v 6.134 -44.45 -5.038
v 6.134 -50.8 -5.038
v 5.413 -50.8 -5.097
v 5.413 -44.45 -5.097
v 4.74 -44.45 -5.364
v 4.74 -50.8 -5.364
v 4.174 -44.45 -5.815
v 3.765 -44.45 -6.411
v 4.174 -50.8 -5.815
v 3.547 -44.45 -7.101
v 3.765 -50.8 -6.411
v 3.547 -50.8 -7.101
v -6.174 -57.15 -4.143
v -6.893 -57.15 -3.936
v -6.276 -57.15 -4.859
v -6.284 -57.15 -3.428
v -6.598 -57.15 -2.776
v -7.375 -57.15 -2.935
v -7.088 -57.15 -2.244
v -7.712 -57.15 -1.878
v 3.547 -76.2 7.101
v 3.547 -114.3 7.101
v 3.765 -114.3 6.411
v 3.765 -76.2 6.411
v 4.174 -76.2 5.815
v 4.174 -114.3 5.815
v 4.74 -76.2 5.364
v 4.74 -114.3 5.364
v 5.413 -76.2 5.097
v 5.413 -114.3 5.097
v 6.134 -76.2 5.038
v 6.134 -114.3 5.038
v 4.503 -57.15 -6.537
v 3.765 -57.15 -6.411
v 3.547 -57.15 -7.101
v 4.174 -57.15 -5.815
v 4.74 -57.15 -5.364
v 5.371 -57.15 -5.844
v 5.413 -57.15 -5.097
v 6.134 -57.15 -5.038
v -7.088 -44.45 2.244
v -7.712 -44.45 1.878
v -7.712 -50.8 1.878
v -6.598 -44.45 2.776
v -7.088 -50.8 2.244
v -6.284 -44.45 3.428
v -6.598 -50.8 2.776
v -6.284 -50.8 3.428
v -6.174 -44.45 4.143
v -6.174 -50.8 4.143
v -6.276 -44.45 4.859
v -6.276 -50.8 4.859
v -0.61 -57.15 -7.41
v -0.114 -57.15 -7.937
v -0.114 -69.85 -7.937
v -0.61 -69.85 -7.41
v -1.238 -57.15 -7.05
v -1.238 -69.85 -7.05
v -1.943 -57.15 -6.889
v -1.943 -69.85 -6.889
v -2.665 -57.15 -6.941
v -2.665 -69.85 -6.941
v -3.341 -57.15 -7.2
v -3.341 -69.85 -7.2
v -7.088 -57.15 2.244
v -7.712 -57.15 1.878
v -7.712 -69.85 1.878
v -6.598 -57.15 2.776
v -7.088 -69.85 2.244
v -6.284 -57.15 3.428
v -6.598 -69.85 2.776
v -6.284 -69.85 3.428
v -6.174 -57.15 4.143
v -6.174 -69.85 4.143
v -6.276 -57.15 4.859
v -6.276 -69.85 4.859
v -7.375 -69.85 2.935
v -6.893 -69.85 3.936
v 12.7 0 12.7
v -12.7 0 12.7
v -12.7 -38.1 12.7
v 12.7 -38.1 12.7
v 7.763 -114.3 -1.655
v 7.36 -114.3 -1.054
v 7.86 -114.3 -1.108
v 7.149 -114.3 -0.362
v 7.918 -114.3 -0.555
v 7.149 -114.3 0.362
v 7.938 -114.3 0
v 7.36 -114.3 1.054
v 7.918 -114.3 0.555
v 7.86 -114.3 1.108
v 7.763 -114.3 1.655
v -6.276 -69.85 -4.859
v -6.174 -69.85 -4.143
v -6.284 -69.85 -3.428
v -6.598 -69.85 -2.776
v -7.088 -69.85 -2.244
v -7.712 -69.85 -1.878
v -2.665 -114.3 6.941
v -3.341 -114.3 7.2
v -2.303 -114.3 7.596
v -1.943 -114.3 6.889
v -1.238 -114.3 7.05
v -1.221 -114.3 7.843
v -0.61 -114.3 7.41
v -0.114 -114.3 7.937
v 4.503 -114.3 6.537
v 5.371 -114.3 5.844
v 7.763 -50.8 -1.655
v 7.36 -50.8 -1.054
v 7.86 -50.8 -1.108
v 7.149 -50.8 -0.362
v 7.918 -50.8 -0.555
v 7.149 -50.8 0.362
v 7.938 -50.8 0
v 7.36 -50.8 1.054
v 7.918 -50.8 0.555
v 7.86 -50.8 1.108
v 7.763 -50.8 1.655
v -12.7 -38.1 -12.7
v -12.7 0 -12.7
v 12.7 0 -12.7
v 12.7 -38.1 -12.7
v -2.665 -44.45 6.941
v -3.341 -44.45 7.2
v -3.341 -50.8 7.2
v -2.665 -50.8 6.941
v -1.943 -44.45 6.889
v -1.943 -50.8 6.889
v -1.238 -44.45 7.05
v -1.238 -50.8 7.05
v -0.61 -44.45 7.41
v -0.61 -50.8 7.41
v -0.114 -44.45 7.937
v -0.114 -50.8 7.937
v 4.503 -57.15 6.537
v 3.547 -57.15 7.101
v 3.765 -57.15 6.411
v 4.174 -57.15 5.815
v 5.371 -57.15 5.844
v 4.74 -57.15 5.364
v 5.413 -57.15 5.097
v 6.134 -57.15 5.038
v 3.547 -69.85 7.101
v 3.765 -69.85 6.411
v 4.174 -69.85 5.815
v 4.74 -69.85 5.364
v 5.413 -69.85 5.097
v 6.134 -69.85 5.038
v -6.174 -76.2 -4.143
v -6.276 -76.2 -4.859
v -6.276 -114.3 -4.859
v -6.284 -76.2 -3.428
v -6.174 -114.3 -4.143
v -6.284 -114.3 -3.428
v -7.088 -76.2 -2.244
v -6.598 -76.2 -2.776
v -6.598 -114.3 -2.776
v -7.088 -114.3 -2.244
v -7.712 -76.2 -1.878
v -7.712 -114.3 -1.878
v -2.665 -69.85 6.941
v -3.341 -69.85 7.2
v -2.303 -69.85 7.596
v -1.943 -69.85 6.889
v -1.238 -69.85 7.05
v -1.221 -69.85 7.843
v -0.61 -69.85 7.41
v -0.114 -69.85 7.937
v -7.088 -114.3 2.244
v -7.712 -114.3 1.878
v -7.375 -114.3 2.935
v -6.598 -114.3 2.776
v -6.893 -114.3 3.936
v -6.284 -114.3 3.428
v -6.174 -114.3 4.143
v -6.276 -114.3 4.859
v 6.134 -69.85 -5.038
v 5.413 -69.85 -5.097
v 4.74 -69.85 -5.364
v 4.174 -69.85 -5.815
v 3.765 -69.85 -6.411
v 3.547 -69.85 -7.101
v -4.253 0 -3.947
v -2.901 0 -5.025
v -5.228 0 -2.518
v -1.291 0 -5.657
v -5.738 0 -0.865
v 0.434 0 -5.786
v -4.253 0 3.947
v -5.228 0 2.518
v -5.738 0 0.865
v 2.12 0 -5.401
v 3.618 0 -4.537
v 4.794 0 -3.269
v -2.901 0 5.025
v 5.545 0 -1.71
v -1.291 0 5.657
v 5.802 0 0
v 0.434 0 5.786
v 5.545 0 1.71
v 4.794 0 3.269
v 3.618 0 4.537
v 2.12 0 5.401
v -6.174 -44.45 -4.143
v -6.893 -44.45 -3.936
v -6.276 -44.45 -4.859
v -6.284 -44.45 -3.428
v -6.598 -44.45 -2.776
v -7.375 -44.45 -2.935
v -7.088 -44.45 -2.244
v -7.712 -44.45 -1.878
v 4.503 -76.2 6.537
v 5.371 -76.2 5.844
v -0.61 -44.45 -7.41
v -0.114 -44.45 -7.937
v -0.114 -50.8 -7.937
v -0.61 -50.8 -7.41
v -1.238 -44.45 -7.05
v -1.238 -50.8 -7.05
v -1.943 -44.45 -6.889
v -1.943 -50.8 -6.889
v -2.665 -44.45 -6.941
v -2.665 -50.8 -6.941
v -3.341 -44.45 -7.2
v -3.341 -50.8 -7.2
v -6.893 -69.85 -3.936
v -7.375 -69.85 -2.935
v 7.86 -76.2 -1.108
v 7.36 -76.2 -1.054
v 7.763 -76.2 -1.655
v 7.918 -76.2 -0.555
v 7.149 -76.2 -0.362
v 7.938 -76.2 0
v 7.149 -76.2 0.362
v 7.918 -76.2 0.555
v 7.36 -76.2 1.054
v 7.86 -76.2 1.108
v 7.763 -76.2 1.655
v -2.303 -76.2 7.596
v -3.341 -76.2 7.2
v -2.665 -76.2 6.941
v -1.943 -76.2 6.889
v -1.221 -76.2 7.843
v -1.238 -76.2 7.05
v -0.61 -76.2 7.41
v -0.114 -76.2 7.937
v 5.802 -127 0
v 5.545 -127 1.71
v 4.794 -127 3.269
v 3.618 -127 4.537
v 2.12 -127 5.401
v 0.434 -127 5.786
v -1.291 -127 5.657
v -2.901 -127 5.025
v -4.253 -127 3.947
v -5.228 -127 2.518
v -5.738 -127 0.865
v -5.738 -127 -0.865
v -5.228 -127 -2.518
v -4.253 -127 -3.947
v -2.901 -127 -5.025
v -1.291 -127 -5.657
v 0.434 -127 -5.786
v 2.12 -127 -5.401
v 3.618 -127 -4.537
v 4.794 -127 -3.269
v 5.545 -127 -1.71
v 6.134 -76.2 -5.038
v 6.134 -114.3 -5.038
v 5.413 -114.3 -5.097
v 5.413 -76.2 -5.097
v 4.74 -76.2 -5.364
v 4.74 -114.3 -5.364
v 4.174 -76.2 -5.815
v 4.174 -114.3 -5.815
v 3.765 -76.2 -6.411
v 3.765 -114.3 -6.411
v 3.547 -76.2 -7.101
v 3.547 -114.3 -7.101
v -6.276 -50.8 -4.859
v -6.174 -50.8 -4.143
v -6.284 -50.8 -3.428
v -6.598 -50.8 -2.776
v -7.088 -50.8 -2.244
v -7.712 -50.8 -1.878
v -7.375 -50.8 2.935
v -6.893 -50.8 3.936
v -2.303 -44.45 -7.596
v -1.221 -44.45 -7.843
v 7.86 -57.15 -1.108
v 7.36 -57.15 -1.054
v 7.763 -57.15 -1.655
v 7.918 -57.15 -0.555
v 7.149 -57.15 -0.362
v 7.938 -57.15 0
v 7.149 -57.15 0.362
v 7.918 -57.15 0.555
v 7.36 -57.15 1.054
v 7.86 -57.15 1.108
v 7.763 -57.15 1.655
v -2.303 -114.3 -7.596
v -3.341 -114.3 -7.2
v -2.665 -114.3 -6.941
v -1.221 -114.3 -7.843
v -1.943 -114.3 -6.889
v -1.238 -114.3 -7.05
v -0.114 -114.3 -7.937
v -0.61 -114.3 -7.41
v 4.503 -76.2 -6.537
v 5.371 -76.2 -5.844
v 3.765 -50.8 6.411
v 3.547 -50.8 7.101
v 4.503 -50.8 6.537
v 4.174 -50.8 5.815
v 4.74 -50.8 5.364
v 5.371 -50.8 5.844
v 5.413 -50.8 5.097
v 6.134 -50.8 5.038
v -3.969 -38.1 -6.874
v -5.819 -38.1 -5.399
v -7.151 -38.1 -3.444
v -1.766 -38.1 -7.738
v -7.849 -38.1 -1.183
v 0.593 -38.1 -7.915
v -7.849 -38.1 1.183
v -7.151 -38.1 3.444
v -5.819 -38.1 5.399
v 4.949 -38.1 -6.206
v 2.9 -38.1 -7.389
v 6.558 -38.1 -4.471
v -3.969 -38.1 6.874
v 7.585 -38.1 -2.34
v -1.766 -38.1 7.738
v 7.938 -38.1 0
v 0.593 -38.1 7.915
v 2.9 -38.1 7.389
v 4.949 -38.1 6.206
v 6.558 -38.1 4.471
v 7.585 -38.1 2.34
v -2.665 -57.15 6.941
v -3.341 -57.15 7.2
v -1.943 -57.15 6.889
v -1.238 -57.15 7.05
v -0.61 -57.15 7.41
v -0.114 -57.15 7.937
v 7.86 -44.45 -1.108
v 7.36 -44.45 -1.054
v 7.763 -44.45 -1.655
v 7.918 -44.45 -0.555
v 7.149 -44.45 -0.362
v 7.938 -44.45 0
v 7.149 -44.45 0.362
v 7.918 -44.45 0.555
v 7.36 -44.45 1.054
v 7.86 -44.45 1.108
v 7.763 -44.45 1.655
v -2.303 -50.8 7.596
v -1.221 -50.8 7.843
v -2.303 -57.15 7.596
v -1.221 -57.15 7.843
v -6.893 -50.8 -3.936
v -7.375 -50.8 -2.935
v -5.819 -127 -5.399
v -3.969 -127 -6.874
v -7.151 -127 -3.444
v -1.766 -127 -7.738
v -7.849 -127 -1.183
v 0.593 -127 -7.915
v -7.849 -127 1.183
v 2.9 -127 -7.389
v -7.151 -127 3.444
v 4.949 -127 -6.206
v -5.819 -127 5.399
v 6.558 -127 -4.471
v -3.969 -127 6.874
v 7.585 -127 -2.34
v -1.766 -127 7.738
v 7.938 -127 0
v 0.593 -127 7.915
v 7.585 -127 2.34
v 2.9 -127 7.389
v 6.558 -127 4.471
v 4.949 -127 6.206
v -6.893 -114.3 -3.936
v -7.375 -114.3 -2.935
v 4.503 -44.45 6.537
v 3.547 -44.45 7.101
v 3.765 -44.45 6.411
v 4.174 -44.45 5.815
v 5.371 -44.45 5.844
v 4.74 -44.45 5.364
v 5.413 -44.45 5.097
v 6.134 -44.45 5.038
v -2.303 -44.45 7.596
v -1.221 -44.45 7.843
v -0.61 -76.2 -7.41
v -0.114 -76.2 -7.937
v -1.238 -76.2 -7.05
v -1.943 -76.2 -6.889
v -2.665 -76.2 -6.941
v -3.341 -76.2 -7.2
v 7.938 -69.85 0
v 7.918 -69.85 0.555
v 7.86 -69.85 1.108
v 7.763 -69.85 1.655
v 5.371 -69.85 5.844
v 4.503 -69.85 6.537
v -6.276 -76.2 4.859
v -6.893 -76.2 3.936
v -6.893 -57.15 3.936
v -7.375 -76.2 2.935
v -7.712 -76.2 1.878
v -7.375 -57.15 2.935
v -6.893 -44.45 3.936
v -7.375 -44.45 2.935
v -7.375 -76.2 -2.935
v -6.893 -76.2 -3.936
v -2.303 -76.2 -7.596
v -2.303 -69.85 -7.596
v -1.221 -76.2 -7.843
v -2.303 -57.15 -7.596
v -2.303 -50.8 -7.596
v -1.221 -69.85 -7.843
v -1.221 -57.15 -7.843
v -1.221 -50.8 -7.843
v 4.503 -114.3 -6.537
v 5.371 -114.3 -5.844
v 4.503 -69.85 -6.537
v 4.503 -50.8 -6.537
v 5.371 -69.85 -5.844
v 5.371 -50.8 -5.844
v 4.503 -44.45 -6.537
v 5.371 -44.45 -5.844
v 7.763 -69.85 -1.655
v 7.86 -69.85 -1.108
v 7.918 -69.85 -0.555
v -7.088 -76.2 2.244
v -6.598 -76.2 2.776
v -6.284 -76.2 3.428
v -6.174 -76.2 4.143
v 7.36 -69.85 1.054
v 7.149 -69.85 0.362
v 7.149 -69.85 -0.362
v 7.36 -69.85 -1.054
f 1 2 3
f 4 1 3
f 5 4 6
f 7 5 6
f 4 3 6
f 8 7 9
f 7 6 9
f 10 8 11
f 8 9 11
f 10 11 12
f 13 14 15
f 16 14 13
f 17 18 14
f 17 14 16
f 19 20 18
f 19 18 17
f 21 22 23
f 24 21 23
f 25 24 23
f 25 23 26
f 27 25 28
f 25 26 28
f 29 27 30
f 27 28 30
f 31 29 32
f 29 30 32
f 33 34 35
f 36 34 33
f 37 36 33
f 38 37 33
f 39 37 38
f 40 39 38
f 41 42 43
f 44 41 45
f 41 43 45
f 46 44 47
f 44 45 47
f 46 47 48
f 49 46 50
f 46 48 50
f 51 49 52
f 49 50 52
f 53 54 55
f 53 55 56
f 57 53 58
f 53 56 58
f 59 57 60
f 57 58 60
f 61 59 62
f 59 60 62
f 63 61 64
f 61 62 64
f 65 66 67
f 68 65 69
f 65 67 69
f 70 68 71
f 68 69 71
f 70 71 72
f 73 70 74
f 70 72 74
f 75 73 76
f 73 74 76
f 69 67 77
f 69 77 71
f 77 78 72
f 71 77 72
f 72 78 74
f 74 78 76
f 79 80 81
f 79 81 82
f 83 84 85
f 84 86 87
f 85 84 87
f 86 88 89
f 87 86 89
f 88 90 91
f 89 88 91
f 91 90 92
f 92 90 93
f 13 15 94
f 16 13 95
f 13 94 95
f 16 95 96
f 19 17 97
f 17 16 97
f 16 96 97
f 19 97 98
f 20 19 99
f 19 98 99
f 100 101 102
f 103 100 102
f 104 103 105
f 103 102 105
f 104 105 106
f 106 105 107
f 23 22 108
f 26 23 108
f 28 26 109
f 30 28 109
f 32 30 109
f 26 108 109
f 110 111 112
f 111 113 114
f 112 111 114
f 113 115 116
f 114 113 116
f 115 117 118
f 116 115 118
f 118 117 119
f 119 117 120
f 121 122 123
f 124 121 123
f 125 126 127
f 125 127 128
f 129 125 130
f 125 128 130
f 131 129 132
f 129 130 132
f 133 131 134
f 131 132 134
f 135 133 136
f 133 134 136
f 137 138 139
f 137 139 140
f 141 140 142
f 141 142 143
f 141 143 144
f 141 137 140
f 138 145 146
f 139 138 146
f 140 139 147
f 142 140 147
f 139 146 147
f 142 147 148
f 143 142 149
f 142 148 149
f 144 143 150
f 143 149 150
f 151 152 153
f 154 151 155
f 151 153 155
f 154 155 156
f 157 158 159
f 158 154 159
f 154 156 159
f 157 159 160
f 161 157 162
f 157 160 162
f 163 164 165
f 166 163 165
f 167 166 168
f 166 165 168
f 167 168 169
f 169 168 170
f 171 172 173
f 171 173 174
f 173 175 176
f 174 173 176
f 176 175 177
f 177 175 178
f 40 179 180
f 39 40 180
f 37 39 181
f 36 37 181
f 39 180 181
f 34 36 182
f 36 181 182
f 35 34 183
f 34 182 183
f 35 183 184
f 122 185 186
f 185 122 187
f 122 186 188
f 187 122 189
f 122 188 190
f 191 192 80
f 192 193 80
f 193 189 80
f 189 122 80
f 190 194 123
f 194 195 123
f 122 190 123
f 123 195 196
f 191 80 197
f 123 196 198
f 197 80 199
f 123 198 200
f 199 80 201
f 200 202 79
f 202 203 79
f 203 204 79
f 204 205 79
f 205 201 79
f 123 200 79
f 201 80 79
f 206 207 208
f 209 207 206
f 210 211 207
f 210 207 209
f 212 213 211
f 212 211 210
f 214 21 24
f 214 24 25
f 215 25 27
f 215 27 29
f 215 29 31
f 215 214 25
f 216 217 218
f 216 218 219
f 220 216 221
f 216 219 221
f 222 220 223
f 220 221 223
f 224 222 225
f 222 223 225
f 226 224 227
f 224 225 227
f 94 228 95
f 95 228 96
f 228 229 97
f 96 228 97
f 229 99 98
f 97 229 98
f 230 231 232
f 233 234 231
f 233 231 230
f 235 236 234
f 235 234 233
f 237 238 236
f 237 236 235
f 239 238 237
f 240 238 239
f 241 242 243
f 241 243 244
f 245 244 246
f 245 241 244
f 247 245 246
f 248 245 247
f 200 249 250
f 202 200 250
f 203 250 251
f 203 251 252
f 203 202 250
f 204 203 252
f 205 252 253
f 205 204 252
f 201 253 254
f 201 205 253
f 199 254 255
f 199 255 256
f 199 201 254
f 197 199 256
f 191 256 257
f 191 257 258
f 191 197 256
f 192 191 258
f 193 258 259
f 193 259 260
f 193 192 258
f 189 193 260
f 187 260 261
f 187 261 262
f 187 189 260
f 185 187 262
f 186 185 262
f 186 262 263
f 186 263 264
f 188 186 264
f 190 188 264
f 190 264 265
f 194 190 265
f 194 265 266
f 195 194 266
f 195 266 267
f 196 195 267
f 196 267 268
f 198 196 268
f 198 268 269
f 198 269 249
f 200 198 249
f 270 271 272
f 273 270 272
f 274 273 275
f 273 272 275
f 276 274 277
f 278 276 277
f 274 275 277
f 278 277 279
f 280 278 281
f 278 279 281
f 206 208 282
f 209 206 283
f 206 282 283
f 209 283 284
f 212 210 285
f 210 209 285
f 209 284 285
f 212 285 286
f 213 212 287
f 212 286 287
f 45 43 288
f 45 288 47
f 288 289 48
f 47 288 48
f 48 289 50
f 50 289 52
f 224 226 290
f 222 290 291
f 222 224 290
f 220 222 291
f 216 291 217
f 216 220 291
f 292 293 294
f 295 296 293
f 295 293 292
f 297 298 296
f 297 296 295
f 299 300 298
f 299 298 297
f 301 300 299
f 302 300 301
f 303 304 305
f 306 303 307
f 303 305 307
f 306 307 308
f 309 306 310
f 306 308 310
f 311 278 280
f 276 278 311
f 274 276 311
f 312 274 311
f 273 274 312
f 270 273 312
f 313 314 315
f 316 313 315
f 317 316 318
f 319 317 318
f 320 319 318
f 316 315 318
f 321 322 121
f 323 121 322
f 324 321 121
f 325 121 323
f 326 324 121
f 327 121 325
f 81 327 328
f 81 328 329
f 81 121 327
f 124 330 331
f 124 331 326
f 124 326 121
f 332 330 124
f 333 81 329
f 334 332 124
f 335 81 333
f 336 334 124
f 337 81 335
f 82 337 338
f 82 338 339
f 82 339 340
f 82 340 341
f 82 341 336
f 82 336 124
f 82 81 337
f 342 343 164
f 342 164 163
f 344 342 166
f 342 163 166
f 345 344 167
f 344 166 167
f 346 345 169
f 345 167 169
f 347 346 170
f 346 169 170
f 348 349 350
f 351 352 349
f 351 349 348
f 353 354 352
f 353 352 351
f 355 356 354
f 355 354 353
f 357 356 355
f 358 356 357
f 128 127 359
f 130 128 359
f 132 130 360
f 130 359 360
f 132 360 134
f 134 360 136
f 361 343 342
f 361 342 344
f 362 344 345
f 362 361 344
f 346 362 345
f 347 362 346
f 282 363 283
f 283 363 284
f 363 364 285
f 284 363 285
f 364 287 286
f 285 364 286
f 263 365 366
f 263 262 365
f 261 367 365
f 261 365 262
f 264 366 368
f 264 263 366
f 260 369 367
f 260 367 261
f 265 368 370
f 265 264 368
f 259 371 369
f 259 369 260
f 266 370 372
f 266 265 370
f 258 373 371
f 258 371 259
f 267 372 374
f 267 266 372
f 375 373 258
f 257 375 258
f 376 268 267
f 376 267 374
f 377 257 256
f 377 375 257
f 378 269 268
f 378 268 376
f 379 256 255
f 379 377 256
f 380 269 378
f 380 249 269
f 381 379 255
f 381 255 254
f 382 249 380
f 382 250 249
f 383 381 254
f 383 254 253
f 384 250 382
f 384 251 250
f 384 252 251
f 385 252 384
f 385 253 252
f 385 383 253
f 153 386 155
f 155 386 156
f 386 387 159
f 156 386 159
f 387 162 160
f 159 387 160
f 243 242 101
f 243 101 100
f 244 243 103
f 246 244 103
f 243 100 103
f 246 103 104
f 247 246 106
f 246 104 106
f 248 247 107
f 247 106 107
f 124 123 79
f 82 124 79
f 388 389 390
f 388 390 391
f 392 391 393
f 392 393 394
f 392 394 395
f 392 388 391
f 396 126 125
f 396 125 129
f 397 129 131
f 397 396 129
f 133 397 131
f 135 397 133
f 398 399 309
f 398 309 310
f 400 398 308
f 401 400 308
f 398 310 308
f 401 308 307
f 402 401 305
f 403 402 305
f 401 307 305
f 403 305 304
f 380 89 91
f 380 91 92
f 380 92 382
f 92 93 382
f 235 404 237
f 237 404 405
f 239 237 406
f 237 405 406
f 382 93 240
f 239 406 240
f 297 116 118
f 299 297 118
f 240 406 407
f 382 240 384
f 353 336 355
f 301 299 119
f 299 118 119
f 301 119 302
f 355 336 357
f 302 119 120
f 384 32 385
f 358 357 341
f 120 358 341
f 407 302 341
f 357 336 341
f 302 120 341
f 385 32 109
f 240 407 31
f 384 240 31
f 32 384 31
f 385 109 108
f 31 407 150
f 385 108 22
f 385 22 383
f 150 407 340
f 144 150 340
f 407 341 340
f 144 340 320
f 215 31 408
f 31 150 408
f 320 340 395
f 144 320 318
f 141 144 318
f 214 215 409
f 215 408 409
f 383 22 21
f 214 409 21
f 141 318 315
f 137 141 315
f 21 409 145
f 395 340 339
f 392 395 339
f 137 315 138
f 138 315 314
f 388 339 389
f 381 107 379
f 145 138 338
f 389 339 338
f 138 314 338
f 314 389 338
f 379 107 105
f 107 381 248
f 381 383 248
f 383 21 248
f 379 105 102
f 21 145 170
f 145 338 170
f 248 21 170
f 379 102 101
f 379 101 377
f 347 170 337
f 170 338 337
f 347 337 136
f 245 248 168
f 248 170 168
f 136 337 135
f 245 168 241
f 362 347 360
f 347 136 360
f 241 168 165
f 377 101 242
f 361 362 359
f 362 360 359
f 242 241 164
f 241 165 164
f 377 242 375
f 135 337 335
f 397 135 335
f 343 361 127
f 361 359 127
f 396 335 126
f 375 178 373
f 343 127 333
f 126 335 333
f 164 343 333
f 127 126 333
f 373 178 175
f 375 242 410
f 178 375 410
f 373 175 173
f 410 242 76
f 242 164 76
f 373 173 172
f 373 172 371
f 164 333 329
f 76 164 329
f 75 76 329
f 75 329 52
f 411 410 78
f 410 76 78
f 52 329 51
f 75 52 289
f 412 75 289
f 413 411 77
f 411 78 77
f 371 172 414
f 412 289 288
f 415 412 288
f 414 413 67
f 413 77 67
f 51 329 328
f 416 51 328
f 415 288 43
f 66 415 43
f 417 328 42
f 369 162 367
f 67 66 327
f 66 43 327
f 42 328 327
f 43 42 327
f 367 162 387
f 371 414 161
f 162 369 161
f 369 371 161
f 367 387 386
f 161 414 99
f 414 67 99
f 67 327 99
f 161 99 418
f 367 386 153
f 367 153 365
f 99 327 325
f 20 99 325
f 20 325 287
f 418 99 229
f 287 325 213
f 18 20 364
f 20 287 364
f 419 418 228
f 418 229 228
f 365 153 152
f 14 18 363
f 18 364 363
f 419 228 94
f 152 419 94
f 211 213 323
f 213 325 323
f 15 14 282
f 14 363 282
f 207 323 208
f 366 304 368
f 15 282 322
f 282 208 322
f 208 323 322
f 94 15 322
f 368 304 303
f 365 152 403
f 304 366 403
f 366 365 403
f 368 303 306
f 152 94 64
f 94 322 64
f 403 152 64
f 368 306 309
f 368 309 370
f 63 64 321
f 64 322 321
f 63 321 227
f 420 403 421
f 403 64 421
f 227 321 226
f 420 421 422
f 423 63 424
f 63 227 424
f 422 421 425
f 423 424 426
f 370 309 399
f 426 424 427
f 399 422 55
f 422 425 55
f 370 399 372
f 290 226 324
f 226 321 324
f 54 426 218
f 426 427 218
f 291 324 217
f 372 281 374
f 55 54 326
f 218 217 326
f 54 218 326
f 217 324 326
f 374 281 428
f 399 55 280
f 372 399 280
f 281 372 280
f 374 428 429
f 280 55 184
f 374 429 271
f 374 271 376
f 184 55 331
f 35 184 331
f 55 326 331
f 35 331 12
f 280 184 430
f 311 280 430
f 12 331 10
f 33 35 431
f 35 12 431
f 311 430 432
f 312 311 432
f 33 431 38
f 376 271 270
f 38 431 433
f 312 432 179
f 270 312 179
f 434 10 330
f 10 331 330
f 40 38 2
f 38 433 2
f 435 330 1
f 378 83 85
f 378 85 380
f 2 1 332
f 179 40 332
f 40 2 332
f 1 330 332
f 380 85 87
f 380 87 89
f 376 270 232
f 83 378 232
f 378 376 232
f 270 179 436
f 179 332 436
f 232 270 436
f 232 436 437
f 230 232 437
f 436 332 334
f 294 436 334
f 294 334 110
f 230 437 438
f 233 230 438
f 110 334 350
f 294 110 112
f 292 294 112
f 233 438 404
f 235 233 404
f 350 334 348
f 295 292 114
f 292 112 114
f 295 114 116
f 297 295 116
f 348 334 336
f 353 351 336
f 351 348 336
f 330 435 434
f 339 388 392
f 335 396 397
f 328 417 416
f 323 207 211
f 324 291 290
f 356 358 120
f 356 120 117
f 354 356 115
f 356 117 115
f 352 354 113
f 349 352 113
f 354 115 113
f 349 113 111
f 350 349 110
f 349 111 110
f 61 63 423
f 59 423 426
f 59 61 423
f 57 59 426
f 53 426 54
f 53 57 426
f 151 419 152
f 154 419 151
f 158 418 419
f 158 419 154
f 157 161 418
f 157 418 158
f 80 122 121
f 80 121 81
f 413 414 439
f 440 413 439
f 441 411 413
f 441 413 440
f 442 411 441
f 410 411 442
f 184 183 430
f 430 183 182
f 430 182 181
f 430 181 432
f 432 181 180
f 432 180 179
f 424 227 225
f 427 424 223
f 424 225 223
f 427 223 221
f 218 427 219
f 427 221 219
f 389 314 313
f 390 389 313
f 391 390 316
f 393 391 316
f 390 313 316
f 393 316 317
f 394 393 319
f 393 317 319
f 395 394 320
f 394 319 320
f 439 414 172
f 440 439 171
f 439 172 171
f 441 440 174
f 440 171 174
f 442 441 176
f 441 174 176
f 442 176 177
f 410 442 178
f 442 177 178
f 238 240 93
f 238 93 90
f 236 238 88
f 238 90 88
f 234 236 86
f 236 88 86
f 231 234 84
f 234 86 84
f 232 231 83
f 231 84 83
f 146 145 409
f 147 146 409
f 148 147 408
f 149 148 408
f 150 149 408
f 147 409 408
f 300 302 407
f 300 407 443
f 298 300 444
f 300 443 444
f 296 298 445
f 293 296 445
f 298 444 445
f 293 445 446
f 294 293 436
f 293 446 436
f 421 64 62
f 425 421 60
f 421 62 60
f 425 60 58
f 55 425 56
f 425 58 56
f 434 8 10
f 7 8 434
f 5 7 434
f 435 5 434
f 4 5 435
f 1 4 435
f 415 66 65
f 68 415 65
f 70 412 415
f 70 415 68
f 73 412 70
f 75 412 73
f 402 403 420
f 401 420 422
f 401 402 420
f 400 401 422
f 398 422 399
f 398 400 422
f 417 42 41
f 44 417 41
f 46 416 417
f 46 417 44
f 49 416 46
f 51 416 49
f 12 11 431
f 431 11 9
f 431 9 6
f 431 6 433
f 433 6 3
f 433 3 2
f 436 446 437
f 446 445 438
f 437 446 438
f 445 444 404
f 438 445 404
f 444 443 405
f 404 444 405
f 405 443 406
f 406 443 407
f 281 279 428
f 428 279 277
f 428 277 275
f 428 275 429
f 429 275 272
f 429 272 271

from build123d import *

# Parameters (mm, degrees)
F0_W     = 25.4
F0_H     = 25.4
F0_R     = 7.9375
F0_R_2   = 5.8024107256
F1_DEPTH = 38.1
F2_DEPTH = 127
F4_START = -12.7
F3_R     = 2.4554456834
F4_DEPTH = 38.1
F5_START = -57.15
F5_DEPTH = 12.7
F6_START = -76.2
F6_DEPTH = 6.35


with BuildPart() as f1:
    # F0 (on Front) → F1 (new body)
    with BuildSketch(Plane.XZ):
        Rectangle(F0_W, F0_H)
        Circle(F0_R, mode=Mode.SUBTRACT)
        Circle(F0_R)
        Circle(F0_R_2, mode=Mode.SUBTRACT)
    extrude(amount=F1_DEPTH)

    # F0 (on Front) → F2 (join)
    with BuildSketch(Plane.XZ):
        Circle(F0_R)
        Circle(F0_R_2, mode=Mode.SUBTRACT)
    extrude(amount=F2_DEPTH)

    # F3 (on face) → F4 (cut)
    with BuildSketch(Plane.XZ.offset(127).offset(F4_START)):
        with Locations((9.5774363726, 0)):
            Circle(F3_R)
        with Locations((5.9714339063, 7.4879412775)):
            Circle(F3_R)
        with Locations((-2.1311800865, 9.3373100468)):
            Circle(F3_R)
        with Locations((-8.6289720061, 4.1554939045)):
            Circle(F3_R)
        with Locations((-8.6289720061, -4.1554939045)):
            Circle(F3_R)
        with Locations((-2.1311800865, -9.3373100468)):
            Circle(F3_R)
        with Locations((5.9714339063, -7.4879412775)):
            Circle(F3_R)
    extrude(amount=-F4_DEPTH, mode=Mode.SUBTRACT)

    # F3 (on face) → F5 (cut)
    with BuildSketch(Plane.XZ.offset(127).offset(F5_START)):
        with Locations((9.5774363726, 0)):
            Circle(F3_R)
        with Locations((5.9714339063, 7.4879412775)):
            Circle(F3_R)
        with Locations((-2.1311800865, 9.3373100468)):
            Circle(F3_R)
        with Locations((-8.6289720061, 4.1554939045)):
            Circle(F3_R)
        with Locations((-8.6289720061, -4.1554939045)):
            Circle(F3_R)
        with Locations((-2.1311800865, -9.3373100468)):
            Circle(F3_R)
        with Locations((5.9714339063, -7.4879412775)):
            Circle(F3_R)
    extrude(amount=-F5_DEPTH, mode=Mode.SUBTRACT)

    # F3 (on face) → F6 (cut)
    with BuildSketch(Plane.XZ.offset(127).offset(F6_START)):
        with Locations((9.5774363726, 0)):
            Circle(F3_R)
        with Locations((5.9714339063, 7.4879412775)):
            Circle(F3_R)
        with Locations((-2.1311800865, 9.3373100468)):
            Circle(F3_R)
        with Locations((-8.6289720061, 4.1554939045)):
            Circle(F3_R)
        with Locations((-8.6289720061, -4.1554939045)):
            Circle(F3_R)
        with Locations((-2.1311800865, -9.3373100468)):
            Circle(F3_R)
        with Locations((5.9714339063, -7.4879412775)):
            Circle(F3_R)
    extrude(amount=-F6_DEPTH, mode=Mode.SUBTRACT)


solid = f1.part
